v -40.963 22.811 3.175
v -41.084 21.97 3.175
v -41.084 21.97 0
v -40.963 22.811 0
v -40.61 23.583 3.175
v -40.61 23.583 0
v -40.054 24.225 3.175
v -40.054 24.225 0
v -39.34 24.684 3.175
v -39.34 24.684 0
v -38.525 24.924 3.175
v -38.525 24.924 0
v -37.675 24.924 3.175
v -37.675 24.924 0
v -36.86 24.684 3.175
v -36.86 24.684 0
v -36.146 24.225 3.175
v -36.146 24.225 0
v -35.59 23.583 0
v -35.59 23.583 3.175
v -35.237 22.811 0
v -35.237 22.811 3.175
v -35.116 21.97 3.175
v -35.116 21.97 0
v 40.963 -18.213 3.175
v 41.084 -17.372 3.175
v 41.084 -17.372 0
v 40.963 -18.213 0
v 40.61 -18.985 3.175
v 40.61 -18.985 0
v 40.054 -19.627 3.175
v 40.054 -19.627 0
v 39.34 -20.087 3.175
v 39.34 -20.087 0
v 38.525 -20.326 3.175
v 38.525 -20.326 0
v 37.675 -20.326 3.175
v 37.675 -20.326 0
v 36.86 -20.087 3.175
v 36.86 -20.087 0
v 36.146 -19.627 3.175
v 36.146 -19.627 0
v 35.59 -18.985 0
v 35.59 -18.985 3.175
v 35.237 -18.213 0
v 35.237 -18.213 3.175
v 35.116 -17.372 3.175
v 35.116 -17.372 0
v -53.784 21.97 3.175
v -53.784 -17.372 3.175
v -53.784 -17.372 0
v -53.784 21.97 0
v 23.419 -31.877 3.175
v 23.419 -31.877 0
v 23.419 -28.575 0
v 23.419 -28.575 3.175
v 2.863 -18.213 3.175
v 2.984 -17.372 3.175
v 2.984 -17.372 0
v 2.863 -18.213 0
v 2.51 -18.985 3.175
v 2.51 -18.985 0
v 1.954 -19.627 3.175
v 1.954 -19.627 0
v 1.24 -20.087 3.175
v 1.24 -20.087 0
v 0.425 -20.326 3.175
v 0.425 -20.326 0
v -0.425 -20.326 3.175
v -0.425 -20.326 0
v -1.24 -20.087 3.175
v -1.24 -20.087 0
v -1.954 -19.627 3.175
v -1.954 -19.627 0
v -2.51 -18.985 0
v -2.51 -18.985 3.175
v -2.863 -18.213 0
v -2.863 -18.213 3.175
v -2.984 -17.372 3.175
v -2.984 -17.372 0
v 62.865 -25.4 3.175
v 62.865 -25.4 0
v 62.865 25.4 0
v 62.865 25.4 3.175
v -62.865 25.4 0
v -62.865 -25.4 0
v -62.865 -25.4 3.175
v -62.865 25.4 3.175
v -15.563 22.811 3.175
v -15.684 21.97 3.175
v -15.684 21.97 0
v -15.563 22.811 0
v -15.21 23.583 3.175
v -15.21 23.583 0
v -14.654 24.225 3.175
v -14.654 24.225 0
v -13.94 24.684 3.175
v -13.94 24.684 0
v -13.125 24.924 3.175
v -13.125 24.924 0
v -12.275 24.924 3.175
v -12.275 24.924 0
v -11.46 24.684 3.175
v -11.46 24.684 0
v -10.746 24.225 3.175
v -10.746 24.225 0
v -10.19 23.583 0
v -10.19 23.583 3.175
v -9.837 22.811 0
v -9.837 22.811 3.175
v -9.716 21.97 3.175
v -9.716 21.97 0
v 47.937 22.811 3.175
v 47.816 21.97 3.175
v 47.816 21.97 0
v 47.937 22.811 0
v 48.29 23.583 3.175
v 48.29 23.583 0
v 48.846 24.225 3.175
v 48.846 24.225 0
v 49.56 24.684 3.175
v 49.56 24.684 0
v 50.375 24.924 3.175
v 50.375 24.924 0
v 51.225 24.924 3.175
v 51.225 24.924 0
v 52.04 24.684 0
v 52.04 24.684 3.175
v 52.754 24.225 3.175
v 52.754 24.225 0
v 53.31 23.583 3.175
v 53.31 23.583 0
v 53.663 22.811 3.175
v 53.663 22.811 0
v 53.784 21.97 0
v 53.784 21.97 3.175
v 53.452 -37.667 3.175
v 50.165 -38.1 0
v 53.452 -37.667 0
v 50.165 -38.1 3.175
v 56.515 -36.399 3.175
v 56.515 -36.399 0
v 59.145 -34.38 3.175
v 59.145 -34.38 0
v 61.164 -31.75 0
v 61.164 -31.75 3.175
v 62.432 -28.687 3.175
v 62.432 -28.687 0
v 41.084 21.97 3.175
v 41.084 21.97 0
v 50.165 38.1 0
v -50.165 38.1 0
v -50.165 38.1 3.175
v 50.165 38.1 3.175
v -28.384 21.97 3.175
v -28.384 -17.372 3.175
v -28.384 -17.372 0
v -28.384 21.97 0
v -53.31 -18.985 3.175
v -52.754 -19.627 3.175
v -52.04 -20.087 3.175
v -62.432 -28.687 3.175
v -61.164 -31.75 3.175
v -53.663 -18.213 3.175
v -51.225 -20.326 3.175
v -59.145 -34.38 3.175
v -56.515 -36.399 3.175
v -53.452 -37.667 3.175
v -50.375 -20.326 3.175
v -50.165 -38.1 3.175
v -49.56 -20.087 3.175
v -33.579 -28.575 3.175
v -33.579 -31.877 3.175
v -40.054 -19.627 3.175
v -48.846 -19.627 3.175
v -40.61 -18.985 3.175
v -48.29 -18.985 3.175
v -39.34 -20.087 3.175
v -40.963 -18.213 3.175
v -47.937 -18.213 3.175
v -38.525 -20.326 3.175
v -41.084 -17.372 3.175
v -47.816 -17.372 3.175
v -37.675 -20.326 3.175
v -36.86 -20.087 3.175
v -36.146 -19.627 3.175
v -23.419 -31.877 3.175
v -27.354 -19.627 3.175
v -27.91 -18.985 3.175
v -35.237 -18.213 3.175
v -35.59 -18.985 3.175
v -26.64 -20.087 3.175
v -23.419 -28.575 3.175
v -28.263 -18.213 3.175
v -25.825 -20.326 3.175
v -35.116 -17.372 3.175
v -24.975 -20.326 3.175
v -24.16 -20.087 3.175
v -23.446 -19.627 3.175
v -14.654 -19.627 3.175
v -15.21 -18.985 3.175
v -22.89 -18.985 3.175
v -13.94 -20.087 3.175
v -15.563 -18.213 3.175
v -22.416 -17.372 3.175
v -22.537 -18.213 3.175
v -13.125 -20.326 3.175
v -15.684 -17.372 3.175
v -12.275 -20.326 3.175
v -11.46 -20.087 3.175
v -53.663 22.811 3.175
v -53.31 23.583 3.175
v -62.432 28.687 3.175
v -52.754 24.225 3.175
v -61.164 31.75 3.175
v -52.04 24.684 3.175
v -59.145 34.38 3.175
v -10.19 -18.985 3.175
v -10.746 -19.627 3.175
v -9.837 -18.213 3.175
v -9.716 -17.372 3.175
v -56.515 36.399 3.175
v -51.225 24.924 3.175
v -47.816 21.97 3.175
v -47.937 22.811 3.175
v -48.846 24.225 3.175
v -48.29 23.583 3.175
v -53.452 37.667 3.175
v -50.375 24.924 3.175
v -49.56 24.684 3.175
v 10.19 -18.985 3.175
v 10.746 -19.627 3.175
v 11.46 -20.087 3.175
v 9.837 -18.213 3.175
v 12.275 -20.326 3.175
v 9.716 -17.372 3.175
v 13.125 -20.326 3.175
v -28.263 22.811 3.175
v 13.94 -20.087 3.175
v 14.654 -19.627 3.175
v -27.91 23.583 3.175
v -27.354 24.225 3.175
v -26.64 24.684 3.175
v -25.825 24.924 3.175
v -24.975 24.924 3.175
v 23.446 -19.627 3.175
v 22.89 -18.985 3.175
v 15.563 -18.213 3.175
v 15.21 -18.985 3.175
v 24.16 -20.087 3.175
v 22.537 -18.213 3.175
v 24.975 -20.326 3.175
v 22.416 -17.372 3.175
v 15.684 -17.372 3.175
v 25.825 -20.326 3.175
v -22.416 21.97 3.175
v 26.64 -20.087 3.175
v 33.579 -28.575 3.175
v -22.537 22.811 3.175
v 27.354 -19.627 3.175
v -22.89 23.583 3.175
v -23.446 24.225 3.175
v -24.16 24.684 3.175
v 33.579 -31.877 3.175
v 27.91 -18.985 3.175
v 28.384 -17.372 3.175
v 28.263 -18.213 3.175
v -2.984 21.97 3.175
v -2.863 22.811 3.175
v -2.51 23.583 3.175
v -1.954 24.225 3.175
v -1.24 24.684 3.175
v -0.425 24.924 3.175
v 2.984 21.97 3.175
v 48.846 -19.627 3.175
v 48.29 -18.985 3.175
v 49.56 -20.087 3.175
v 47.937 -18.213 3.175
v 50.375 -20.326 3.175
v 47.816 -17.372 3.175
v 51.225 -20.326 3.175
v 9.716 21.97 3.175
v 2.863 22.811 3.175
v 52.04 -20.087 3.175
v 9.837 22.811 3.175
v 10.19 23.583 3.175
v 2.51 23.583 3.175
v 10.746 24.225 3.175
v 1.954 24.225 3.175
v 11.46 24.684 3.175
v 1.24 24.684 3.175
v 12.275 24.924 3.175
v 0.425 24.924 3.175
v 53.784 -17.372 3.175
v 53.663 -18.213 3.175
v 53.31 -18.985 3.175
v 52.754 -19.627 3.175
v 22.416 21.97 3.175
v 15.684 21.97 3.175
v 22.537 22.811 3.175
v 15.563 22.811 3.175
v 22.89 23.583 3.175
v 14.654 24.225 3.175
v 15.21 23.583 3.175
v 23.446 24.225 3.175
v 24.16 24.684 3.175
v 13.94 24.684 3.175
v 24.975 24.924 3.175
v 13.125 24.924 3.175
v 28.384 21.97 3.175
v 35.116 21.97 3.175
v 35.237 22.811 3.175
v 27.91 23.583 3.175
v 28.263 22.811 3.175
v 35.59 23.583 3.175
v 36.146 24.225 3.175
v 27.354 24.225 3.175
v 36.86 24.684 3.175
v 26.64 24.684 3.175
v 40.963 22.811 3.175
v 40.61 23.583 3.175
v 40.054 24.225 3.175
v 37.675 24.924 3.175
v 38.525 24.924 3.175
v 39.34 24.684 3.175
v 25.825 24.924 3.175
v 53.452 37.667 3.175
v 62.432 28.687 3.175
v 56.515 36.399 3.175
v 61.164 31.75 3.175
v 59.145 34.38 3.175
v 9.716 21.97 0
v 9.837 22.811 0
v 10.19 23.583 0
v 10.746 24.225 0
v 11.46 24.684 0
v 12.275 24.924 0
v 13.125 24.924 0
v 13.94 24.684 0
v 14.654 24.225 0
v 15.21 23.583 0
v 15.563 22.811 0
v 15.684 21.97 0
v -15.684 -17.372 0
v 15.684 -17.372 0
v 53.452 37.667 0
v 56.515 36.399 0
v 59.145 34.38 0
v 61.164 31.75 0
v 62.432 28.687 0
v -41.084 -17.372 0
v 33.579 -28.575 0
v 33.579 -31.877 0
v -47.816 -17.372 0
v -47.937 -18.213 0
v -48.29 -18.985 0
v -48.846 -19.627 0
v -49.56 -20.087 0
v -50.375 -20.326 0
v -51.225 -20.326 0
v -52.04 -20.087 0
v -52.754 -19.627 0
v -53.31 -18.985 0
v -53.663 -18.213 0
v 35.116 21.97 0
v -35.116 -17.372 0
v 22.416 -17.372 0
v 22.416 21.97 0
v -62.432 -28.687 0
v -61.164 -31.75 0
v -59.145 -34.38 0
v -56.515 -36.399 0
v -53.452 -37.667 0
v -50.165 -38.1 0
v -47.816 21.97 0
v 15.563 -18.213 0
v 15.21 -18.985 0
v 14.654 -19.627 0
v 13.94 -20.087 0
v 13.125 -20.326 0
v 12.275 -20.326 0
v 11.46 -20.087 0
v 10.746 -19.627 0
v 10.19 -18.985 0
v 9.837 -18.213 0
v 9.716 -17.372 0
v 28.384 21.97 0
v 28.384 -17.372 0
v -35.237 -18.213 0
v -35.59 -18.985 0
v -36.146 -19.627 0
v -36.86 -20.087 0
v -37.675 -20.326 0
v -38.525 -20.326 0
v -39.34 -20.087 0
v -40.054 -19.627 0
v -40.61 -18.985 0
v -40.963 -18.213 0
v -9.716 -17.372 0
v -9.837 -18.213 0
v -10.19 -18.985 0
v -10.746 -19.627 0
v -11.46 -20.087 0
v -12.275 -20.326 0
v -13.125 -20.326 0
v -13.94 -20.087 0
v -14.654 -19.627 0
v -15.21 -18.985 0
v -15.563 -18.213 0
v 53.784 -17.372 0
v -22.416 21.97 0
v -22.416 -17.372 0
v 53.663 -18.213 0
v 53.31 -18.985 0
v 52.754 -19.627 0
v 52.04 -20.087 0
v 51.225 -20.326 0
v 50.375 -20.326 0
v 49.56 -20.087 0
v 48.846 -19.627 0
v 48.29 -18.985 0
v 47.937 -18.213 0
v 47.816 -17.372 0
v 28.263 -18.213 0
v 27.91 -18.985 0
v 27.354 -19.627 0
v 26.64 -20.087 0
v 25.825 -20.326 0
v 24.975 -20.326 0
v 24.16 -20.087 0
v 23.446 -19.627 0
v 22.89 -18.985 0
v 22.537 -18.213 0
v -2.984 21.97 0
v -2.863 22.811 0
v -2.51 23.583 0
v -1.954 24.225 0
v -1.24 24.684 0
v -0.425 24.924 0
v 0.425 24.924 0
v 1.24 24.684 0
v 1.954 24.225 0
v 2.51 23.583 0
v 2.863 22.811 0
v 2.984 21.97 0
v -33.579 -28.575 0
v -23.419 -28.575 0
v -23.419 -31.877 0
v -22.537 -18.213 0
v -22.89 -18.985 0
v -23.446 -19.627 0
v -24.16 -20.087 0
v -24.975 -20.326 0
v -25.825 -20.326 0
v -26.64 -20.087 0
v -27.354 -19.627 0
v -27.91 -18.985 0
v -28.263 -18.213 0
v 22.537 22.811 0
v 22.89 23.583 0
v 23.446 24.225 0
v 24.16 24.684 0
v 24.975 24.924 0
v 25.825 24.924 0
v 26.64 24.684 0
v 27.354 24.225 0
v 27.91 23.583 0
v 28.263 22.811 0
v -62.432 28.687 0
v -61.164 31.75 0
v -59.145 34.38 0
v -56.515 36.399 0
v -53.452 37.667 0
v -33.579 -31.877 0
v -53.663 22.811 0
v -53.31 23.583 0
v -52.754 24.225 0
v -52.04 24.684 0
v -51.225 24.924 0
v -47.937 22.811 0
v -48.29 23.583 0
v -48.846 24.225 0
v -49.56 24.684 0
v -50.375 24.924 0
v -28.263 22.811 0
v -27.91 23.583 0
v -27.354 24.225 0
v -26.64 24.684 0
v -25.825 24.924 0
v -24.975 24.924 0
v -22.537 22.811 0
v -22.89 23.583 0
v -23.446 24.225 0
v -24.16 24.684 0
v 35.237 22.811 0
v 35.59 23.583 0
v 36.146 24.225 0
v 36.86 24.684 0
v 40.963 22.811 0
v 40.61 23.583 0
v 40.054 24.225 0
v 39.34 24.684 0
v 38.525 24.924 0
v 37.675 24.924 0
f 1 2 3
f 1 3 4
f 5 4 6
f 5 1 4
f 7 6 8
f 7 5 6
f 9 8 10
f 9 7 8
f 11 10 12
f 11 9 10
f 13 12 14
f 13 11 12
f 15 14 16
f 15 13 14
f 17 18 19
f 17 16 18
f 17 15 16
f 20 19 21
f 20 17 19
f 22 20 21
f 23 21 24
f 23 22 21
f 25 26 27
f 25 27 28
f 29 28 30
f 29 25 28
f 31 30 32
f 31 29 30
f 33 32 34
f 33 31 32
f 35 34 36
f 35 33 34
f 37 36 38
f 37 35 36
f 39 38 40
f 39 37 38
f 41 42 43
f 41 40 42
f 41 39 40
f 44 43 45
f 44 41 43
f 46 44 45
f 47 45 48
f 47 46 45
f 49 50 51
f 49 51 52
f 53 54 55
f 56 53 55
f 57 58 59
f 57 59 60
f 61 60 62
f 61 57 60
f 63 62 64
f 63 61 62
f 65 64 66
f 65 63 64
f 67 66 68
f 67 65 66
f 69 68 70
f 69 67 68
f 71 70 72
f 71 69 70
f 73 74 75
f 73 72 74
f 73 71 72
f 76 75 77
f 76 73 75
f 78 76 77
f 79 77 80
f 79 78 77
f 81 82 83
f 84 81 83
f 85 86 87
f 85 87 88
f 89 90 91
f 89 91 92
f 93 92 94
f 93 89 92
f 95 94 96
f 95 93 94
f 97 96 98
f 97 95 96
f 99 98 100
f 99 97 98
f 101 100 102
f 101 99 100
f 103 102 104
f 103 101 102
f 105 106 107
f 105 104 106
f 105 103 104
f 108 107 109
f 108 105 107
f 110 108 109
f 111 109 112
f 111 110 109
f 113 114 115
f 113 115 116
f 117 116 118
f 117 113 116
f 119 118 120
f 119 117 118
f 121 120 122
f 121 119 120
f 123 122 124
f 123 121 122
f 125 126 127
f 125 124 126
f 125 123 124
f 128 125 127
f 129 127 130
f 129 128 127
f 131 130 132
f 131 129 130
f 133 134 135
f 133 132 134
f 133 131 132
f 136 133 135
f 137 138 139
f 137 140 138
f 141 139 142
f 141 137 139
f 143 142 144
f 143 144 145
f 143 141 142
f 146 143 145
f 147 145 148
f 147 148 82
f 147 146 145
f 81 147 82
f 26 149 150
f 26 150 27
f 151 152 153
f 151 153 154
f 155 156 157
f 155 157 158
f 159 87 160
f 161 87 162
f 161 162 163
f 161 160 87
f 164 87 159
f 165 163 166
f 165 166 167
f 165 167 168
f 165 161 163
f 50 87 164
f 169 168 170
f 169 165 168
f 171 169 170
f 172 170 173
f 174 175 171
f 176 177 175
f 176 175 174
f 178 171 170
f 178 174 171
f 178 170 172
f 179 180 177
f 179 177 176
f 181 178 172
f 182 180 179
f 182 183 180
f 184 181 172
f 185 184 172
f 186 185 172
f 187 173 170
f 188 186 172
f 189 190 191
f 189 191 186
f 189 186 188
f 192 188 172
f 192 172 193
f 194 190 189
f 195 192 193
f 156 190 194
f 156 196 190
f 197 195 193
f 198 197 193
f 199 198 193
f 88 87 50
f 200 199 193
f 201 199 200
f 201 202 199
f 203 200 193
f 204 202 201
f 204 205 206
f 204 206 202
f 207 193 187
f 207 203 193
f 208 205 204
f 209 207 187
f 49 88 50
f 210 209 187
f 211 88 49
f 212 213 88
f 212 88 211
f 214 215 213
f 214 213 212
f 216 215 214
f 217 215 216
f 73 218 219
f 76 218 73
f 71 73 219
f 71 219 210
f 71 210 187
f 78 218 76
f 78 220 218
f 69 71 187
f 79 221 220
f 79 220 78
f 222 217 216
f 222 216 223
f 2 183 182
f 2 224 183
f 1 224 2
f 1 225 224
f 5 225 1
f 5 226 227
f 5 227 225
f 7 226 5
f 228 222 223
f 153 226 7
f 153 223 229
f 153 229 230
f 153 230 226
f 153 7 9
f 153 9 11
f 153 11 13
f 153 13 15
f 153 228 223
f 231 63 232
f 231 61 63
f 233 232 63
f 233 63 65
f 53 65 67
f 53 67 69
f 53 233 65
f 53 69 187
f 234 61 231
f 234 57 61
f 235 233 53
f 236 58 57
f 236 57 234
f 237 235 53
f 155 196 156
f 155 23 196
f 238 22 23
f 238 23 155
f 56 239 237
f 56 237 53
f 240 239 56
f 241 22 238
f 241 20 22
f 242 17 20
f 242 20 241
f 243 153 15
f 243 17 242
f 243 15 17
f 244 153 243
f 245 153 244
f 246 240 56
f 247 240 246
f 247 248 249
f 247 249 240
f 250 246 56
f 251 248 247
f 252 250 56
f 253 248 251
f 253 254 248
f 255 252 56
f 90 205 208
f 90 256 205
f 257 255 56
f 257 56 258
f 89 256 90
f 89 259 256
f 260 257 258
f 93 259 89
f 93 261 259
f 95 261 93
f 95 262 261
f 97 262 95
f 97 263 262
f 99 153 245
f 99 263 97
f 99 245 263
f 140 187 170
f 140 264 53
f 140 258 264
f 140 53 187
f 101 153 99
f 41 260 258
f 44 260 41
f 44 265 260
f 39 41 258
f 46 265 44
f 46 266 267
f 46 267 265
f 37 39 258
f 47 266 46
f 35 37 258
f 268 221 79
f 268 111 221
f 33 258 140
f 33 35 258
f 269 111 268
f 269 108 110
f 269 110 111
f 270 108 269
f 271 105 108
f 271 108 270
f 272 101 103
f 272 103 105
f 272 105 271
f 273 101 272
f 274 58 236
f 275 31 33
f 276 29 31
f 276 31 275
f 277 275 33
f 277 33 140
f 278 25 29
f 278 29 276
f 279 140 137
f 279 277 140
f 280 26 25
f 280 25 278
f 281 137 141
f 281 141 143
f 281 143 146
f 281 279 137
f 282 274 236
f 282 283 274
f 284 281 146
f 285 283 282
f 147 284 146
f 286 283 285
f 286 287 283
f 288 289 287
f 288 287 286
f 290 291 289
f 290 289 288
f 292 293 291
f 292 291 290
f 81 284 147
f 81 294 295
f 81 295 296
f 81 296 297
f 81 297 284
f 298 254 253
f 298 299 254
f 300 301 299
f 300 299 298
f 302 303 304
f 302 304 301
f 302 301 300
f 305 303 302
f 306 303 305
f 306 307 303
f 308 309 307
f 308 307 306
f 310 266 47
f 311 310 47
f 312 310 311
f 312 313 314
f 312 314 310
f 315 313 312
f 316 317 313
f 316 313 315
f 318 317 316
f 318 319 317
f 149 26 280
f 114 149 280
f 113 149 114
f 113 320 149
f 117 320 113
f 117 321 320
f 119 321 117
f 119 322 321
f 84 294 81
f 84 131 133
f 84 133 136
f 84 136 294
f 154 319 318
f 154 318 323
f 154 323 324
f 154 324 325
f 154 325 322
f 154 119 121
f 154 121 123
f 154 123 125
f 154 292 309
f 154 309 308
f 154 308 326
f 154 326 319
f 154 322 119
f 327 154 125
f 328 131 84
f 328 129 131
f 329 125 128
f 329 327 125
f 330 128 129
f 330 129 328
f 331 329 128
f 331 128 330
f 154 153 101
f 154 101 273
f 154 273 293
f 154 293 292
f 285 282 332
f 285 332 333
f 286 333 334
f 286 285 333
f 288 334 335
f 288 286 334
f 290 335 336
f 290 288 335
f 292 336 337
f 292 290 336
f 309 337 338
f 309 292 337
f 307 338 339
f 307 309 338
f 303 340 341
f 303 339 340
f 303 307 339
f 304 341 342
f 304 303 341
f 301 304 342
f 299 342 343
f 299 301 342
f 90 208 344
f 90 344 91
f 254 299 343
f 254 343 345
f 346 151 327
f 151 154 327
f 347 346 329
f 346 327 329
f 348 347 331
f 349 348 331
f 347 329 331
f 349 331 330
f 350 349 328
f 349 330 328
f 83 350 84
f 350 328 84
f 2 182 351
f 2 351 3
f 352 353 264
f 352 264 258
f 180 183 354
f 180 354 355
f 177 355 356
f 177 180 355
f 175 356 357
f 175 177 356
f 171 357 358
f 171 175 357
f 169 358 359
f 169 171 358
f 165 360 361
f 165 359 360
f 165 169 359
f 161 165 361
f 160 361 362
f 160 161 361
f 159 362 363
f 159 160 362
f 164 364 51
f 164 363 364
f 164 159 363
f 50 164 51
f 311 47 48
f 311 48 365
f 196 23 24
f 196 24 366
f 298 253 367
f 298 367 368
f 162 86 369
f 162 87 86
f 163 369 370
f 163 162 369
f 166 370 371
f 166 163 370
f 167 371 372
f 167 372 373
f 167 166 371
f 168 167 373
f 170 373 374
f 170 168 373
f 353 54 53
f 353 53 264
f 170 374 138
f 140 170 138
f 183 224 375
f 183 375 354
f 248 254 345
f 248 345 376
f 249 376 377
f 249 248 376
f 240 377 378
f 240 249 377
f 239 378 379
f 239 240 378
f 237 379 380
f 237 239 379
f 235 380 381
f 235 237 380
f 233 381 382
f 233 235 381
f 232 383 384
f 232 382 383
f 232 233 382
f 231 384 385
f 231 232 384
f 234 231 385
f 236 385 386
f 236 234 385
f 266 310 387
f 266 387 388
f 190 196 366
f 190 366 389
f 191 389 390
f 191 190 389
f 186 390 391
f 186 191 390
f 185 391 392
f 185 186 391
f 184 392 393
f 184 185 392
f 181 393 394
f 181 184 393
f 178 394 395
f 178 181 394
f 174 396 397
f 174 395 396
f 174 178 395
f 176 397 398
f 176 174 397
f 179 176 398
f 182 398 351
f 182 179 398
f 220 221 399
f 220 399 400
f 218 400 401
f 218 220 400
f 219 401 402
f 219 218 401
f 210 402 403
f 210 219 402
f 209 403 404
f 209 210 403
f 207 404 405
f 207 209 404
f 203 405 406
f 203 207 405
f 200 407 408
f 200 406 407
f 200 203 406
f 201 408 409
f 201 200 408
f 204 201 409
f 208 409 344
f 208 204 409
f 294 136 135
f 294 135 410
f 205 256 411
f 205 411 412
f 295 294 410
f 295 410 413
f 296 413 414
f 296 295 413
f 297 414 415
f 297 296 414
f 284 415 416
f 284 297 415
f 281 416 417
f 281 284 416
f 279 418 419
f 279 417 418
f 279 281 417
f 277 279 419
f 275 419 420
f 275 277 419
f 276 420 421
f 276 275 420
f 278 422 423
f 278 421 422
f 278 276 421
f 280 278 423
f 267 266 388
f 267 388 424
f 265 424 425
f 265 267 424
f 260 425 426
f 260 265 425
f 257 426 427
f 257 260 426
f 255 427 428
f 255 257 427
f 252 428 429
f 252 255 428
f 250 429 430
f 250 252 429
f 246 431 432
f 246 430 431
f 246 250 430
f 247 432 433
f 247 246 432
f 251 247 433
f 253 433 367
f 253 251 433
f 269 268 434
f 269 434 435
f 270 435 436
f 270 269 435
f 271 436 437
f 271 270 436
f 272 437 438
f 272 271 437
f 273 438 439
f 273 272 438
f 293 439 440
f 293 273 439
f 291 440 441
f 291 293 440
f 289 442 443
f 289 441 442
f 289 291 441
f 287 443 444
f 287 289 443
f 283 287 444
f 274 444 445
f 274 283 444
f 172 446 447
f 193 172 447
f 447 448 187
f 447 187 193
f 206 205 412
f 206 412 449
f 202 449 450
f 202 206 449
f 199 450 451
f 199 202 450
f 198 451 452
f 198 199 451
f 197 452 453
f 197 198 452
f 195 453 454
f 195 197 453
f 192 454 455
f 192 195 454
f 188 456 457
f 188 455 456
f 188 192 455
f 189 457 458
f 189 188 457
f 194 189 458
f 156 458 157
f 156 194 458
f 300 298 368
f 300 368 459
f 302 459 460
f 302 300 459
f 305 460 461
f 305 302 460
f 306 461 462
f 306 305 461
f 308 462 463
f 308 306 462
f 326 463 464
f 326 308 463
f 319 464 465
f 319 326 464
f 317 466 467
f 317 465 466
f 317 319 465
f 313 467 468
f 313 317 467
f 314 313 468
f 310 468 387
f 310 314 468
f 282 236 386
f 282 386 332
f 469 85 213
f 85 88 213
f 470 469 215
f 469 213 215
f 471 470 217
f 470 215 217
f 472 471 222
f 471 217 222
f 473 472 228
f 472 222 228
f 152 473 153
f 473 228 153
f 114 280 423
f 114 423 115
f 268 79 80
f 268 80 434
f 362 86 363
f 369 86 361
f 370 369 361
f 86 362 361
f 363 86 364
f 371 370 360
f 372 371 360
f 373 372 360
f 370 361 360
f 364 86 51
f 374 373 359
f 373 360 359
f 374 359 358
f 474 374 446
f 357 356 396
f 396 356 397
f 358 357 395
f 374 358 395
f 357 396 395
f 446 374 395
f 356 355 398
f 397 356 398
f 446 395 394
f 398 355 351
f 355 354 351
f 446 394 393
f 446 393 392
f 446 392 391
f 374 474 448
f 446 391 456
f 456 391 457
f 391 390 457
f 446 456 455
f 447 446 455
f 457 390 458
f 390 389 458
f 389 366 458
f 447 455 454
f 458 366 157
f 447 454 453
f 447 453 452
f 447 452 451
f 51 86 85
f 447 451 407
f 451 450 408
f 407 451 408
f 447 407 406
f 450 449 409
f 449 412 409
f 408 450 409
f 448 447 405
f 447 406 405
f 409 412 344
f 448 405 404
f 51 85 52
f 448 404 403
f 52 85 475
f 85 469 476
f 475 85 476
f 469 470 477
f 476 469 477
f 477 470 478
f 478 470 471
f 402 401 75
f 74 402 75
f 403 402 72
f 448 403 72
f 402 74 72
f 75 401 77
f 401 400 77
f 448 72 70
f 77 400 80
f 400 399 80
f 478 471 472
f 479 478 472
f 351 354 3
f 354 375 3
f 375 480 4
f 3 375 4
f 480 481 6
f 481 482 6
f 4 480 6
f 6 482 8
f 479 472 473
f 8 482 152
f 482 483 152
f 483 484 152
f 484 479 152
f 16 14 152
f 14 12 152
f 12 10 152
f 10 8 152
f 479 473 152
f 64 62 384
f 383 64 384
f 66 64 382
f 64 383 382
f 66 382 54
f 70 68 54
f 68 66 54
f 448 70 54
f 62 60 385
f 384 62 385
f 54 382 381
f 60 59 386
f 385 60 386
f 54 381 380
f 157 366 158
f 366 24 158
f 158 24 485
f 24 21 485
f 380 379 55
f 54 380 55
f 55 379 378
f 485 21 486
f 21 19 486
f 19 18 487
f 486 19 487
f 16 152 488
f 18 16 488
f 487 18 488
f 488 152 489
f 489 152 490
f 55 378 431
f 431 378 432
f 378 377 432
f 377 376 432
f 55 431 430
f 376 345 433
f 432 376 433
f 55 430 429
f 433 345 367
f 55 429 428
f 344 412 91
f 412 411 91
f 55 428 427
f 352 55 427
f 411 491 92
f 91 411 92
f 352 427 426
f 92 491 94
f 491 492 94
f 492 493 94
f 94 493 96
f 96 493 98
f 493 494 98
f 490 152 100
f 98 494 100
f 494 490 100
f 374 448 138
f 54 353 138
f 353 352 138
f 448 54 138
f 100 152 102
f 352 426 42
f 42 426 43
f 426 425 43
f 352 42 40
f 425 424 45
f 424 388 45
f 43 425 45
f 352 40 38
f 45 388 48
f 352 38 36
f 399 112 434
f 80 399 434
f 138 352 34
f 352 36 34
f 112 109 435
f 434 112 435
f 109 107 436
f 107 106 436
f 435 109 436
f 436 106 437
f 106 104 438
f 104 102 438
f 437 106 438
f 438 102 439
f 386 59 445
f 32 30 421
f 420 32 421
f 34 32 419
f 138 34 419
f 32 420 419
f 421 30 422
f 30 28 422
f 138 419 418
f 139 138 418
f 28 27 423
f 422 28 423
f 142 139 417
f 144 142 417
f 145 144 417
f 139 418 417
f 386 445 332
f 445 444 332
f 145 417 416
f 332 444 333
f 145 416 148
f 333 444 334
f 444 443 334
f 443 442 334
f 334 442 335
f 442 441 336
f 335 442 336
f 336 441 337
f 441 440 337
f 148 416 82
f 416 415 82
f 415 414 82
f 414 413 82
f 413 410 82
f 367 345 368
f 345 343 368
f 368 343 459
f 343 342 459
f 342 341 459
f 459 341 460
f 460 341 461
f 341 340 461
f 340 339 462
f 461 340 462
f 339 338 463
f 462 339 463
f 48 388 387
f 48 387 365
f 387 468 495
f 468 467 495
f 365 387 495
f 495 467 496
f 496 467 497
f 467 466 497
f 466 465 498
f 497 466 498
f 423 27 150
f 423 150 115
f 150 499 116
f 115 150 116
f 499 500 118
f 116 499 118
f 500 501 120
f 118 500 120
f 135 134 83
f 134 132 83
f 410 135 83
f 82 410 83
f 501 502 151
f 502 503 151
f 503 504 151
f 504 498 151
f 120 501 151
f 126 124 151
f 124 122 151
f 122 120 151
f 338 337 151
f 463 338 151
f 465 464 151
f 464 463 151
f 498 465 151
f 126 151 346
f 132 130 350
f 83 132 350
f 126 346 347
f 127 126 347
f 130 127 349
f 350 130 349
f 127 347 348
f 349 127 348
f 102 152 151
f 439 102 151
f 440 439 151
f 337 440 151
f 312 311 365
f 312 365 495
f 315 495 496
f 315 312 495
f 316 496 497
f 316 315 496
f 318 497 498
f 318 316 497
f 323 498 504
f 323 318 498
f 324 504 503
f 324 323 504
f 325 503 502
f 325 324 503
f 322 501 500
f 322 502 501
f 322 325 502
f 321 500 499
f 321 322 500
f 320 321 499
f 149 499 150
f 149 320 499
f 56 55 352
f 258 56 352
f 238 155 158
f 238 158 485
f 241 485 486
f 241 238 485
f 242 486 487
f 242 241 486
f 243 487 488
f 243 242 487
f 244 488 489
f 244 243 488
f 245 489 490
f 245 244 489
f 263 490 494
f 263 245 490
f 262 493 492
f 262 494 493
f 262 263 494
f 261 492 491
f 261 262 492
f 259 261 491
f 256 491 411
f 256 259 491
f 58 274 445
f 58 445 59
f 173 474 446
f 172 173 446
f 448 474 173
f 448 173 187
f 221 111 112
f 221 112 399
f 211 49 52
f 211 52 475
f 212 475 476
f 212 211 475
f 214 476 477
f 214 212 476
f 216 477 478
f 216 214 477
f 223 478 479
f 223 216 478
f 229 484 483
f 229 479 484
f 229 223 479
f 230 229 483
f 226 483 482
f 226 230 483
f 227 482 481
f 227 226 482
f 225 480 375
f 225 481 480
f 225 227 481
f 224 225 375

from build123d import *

# Parameters (mm, degrees)
SKETCH1_W           = 125.73
SKETCH1_H           = 76.2
SKETCH1_W_2         = 10.16
SKETCH1_H_2         = 3.302
BOSS_EXTRUDE1_DEPTH = 3.175
FILLET1_R           = 12.7
CUT_EXTRUDE2_DEPTH  = 74.577842113


with BuildPart() as part:
    # Sketch1 → Boss-Extrude1 (new body)
    with BuildSketch(Plane.XY):
        Rectangle(SKETCH1_W, SKETCH1_H)
        with Locations((-28.4988, -30.226)):
            Rectangle(SKETCH1_W_2, SKETCH1_H_2, mode=Mode.SUBTRACT)
        with Locations((28.4988, -30.226)):
            Rectangle(SKETCH1_W_2, SKETCH1_H_2, mode=Mode.SUBTRACT)
    extrude(amount=BOSS_EXTRUDE1_DEPTH)

    # Fillet1
    fillet1_edges = [part.edges().sort_by_distance(p)[0] for p in [
        (62.865, -38.1, 1.5875),
        (-62.865, -38.1, 1.5875),
        (-62.865, 38.1, 1.5875),
        (62.865, 38.1, 1.5875),
    ]]
    fillet(fillet1_edges, radius=FILLET1_R)

    # Sketch5 → Cut-Extrude2 (cut, through all)
    with BuildSketch(Plane.XY.offset(3.175)):
        with BuildLine():
            Line((2.984111333, 21.969779064), (2.984111333, -17.372056987))
            ThreePointArc((2.984111333, -17.372056987), (0, -20.35616832), (-2.984111333, -17.372056987))
            Line((-2.984111333, -17.372056987), (-2.984111333, 21.969779064))
            ThreePointArc((-2.984111333, 21.969779064), (0, 24.953890397), (2.984111333, 21.969779064))
        make_face()
        with BuildLine():
            Line((15.684111333, 21.969779064), (15.684111333, -17.372056987))
            ThreePointArc((15.684111333, -17.372056987), (12.7, -20.35616832), (9.715888667, -17.372056987))
            Line((9.715888667, -17.372056987), (9.715888667, 21.969779064))
            ThreePointArc((9.715888667, 21.969779064), (12.7, 24.953890397), (15.684111333, 21.969779064))
        make_face()
        with BuildLine():
            Line((28.384111333, 21.969779064), (28.384111333, -17.372056987))
            ThreePointArc((28.384111333, -17.372056987), (25.4, -20.35616832), (22.415888667, -17.372056987))
            Line((22.415888667, -17.372056987), (22.415888667, 21.969779064))
            ThreePointArc((22.415888667, 21.969779064), (25.4, 24.953890397), (28.384111333, 21.969779064))
        make_face()
        with BuildLine():
            Line((41.084111333, 21.969779064), (41.084111333, -17.372056987))
            ThreePointArc((41.084111333, -17.372056987), (38.1, -20.35616832), (35.115888667, -17.372056987))
            Line((35.115888667, -17.372056987), (35.115888667, 21.969779064))
            ThreePointArc((35.115888667, 21.969779064), (38.1, 24.953890397), (41.084111333, 21.969779064))
        make_face()
        with BuildLine():
            Line((53.784111333, 21.969779064), (53.784111333, -17.372056987))
            ThreePointArc((53.784111333, -17.372056987), (50.8, -20.35616832), (47.815888667, -17.372056987))
            Line((47.815888667, -17.372056987), (47.815888667, 21.969779064))
            ThreePointArc((47.815888667, 21.969779064), (50.8, 24.953890397), (53.784111333, 21.969779064))
        make_face()
        with BuildLine():
            Line((-9.715888667, 21.969779064), (-9.715888667, -17.372056987))
            ThreePointArc((-9.715888667, -17.372056987), (-12.7, -20.35616832), (-15.684111333, -17.372056987))
            Line((-15.684111333, -17.372056987), (-15.684111333, 21.969779064))
            ThreePointArc((-15.684111333, 21.969779064), (-12.7, 24.953890397), (-9.715888667, 21.969779064))
        make_face()
        with BuildLine():
            Line((-22.415888667, 21.969779064), (-22.415888667, -17.372056987))
            ThreePointArc((-22.415888667, -17.372056987), (-25.4, -20.35616832), (-28.384111333, -17.372056987))
            Line((-28.384111333, -17.372056987), (-28.384111333, 21.969779064))
            ThreePointArc((-28.384111333, 21.969779064), (-25.4, 24.953890397), (-22.415888667, 21.969779064))
        make_face()
        with BuildLine():
            Line((-35.115888667, 21.969779064), (-35.115888667, -17.372056987))
            ThreePointArc((-35.115888667, -17.372056987), (-38.1, -20.35616832), (-41.084111333, -17.372056987))
            Line((-41.084111333, -17.372056987), (-41.084111333, 21.969779064))
            ThreePointArc((-41.084111333, 21.969779064), (-38.1, 24.953890397), (-35.115888667, 21.969779064))
        make_face()
        with BuildLine():
            Line((-47.815888667, 21.969779064), (-47.815888667, -17.372056987))
            ThreePointArc((-47.815888667, -17.372056987), (-50.8, -20.35616832), (-53.784111333, -17.372056987))
            Line((-53.784111333, -17.372056987), (-53.784111333, 21.969779064))
            ThreePointArc((-53.784111333, 21.969779064), (-50.8, 24.953890397), (-47.815888667, 21.969779064))
        make_face()
    extrude(amount=-CUT_EXTRUDE2_DEPTH, mode=Mode.SUBTRACT)


solid = part.part
